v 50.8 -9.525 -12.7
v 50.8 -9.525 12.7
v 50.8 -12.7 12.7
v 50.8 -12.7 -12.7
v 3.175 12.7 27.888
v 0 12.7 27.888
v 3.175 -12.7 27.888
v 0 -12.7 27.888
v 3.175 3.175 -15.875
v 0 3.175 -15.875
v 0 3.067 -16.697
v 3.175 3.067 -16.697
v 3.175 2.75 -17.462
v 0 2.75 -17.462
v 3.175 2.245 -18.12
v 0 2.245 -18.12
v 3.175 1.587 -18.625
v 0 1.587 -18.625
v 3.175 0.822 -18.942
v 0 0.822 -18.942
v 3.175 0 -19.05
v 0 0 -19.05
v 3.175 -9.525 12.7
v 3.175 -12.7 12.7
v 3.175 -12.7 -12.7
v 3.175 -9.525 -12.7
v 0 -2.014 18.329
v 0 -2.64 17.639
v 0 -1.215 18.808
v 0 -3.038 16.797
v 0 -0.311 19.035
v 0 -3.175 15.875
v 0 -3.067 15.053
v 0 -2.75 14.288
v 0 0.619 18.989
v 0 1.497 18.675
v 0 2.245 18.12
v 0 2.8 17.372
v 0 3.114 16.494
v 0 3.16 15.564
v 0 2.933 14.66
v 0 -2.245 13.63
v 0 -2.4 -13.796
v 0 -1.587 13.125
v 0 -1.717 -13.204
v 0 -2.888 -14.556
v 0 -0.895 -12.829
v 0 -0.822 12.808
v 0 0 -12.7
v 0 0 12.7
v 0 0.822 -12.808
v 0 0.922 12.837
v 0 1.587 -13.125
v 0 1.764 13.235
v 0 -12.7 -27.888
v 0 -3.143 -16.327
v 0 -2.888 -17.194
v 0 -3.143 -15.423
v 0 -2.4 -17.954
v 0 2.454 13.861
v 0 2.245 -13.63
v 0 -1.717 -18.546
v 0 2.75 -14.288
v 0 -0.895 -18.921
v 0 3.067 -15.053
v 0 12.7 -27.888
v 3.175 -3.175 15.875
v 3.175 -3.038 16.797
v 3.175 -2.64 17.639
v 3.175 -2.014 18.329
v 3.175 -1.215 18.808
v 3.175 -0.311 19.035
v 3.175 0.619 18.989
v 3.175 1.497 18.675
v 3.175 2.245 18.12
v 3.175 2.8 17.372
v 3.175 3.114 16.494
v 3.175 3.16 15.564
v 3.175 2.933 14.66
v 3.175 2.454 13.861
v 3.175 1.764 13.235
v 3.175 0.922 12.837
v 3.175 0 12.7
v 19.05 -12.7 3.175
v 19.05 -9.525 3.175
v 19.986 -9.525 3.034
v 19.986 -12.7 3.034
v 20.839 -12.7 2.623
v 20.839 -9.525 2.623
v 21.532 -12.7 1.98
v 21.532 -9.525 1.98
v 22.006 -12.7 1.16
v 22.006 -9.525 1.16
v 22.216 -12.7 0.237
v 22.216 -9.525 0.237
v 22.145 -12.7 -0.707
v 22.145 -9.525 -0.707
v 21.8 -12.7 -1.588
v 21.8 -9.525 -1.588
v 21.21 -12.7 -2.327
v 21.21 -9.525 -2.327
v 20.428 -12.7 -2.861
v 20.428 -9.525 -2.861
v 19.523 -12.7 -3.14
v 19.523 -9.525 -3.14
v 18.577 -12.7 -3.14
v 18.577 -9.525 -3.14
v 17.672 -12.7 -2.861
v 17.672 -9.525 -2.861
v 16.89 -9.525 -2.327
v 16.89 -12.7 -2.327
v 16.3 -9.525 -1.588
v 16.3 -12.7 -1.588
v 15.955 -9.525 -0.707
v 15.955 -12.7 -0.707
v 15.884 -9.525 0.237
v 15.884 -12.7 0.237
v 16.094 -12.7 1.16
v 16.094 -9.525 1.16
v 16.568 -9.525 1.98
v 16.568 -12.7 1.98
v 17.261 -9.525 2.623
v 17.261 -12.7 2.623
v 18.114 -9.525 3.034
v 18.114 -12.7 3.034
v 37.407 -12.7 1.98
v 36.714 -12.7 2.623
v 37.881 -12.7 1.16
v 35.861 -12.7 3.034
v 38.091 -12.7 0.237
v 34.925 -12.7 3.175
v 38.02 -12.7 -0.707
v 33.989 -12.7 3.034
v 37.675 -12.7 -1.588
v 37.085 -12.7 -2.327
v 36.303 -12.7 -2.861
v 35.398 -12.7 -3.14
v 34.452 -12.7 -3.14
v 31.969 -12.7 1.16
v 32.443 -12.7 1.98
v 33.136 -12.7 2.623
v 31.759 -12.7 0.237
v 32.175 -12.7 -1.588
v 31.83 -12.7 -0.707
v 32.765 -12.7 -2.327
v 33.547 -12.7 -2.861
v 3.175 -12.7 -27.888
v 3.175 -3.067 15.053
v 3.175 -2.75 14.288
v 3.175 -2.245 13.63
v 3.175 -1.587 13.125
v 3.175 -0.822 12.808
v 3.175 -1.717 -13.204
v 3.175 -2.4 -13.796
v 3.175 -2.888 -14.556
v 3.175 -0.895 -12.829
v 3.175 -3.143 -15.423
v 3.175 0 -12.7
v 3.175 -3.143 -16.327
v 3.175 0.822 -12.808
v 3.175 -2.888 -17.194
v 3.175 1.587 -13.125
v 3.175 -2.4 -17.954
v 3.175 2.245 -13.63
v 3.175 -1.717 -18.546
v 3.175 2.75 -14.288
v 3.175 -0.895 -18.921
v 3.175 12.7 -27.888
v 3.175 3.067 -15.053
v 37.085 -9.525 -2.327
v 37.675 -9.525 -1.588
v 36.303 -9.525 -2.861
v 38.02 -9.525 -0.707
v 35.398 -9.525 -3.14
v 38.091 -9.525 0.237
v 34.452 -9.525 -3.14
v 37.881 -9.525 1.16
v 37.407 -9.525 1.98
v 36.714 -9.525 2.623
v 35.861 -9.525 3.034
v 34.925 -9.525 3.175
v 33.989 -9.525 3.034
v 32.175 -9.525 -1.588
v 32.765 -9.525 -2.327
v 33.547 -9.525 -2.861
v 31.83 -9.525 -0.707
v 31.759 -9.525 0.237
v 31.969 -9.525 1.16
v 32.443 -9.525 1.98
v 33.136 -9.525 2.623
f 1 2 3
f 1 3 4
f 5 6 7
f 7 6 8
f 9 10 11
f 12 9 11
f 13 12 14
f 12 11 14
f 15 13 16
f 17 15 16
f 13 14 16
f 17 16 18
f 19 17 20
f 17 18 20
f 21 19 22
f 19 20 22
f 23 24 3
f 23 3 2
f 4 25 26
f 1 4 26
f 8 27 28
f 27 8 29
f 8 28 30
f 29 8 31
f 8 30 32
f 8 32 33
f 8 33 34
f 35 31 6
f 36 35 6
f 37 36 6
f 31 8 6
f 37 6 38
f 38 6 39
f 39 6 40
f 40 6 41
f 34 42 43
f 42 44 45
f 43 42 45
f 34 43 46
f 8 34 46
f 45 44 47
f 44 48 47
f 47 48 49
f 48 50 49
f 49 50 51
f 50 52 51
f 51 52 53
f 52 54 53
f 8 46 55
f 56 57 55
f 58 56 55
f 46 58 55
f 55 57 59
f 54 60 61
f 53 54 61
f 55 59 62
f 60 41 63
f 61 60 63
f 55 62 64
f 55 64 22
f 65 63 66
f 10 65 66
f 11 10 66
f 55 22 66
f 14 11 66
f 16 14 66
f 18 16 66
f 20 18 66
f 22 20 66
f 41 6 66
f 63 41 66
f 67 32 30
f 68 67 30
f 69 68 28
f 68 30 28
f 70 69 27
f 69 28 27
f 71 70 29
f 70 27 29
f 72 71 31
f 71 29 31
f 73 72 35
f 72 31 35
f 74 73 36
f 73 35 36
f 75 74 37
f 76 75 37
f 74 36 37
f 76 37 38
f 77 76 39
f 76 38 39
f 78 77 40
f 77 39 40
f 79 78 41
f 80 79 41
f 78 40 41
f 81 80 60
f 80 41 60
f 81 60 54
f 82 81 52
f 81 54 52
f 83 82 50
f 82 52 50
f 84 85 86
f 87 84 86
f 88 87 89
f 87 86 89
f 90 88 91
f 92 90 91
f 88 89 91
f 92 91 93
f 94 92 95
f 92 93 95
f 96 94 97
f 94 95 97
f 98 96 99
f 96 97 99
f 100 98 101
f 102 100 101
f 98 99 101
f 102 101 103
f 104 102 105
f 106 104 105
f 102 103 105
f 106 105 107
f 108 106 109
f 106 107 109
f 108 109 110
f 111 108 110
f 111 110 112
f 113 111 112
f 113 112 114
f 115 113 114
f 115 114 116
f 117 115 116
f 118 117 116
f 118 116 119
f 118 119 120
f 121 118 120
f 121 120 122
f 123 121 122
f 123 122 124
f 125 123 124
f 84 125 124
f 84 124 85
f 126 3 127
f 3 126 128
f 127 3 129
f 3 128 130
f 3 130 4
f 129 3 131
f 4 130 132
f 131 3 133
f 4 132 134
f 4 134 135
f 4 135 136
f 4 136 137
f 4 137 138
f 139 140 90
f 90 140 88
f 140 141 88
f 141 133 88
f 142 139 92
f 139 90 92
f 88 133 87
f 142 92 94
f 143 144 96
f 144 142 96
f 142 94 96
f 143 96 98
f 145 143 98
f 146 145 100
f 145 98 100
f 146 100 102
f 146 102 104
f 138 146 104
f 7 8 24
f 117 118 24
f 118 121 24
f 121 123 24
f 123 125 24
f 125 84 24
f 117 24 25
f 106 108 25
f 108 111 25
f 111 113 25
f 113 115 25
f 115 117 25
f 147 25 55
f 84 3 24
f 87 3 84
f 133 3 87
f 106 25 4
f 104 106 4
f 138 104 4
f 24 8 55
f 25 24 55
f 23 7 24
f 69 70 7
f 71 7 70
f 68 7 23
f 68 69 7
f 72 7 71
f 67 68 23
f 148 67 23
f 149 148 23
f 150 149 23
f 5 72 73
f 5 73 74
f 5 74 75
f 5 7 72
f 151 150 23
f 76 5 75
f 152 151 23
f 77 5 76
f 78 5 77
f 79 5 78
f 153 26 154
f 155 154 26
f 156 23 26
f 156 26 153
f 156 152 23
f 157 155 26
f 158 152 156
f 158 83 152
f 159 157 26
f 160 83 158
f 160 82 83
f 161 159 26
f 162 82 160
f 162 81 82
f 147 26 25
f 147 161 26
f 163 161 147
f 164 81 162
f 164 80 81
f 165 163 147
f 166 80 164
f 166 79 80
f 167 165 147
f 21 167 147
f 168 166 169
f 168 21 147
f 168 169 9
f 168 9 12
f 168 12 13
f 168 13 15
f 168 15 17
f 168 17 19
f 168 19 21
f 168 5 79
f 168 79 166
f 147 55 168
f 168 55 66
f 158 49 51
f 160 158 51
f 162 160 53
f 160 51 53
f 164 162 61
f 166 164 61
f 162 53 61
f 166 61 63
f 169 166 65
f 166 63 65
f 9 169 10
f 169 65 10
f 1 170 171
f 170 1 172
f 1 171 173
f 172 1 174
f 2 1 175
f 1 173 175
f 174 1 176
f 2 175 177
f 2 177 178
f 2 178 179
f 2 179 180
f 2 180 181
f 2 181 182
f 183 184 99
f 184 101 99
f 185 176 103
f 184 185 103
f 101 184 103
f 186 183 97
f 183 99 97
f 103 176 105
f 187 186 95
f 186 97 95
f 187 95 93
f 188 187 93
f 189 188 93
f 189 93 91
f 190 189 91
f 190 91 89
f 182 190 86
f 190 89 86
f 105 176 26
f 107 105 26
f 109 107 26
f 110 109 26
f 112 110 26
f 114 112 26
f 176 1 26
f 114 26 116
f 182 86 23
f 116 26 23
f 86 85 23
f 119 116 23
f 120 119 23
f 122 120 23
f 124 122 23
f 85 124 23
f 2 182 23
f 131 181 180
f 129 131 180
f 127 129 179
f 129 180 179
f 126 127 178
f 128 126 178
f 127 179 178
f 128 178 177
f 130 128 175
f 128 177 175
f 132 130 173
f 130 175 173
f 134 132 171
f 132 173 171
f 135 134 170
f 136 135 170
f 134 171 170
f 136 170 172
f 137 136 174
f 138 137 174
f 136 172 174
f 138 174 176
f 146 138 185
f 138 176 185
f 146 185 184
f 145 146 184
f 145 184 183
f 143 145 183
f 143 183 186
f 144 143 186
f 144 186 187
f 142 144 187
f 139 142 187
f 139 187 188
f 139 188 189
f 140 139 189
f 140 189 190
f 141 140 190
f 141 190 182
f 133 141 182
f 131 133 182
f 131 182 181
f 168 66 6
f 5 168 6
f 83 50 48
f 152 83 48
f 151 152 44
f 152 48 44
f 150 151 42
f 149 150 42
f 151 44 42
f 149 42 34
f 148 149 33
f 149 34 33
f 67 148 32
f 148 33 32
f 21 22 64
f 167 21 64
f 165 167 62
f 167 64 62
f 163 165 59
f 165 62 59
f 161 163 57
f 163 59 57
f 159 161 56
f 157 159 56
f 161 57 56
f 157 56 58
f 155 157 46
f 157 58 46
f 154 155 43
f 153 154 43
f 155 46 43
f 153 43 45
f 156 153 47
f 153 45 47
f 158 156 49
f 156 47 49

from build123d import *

# Parameters (mm, degrees)
BOSS_EXTRUDE3_DEPTH = 3.175
SKETCH3_W           = 12.7
SKETCH3_H           = 3.175
BOSS_EXTRUDE4_DEPTH = 47.625
SKETCH4_R           = 3.175
CUT_EXTRUDE1_DEPTH  = 16.256


with BuildPart() as part:
    # Sketch1 → Boss-Extrude3 (new body)
    with BuildSketch(Plane(origin=(0, 0, 0), x_dir=(0, 0, -1), z_dir=(1, 0, 0))):
        with BuildLine():
            ThreePointArc((-15.875, -3.175), (-18.12006403, 2.24506403), (-12.7, 0))
            Line((-12.7, 0), (0, 0))
            Line((0, 0), (0, 12.7))
            Line((0, 12.7), (-22.115038819, 12.7))
            Line((-22.115038819, 12.7), (-27.887655145, 12.7))
            Line((-27.887655145, 12.7), (-27.887655145, -12.7))
            Line((-27.887655145, -12.7), (-15.875, -12.7))
            Line((-15.875, -12.7), (-15.875, -3.175))
        make_face()
        with BuildLine():
            Line((0, 12.7), (0, 0))
            Line((0, 0), (12.7, 0))
            ThreePointArc((12.7, 0), (13.62993597, 2.24506403), (15.875, 3.175))
            Line((15.875, 3.175), (15.875, 12.7))
            Line((15.875, 12.7), (0, 12.7))
        make_face()
        with BuildLine():
            Line((0, 0), (-12.7, 0))
            ThreePointArc((-12.7, 0), (-13.62993597, -2.24506403), (-15.875, -3.175))
            Line((-15.875, -3.175), (-15.875, -12.7))
            Line((-15.875, -12.7), (22.115038819, -12.7))
            Line((22.115038819, -12.7), (27.887655145, -12.7))
            Line((27.887655145, -12.7), (27.887655145, 12.7))
            Line((27.887655145, 12.7), (15.875, 12.7))
            Line((15.875, 12.7), (15.875, 3.175))
            ThreePointArc((15.875, 3.175), (18.12006403, 2.24506403), (19.05, 0))
            ThreePointArc((19.05, 0), (15.875, -3.175), (12.7, 0))
            Line((12.7, 0), (0, 0))
        make_face()
    extrude(amount=BOSS_EXTRUDE3_DEPTH)

    # Sketch3 → Boss-Extrude4 (add)
    with BuildSketch(Plane(origin=(3.175, 0, 0), x_dir=(0, 0, -1), z_dir=(1, 0, 0))):
        with Locations((-6.35, -11.1125)):
            Rectangle(SKETCH3_W, SKETCH3_H)
        with Locations((6.35, -11.1125)):
            Rectangle(SKETCH3_W, SKETCH3_H)
    extrude(amount=BOSS_EXTRUDE4_DEPTH)

    # Sketch4 → Cut-Extrude1 (cut)
    with BuildSketch(Plane(origin=(0, -9.525, 0), x_dir=(1, 0, 0), z_dir=(0, 1, 0))):
        with Locations(Location((19.05, 0, 0), (0, 0, 270))):
            Circle(SKETCH4_R)
        with Locations(Location((34.925, 0, 0), (0, 0, 270))):
            Circle(SKETCH4_R)
    extrude(amount=-CUT_EXTRUDE1_DEPTH, mode=Mode.SUBTRACT)


solid = part.part
